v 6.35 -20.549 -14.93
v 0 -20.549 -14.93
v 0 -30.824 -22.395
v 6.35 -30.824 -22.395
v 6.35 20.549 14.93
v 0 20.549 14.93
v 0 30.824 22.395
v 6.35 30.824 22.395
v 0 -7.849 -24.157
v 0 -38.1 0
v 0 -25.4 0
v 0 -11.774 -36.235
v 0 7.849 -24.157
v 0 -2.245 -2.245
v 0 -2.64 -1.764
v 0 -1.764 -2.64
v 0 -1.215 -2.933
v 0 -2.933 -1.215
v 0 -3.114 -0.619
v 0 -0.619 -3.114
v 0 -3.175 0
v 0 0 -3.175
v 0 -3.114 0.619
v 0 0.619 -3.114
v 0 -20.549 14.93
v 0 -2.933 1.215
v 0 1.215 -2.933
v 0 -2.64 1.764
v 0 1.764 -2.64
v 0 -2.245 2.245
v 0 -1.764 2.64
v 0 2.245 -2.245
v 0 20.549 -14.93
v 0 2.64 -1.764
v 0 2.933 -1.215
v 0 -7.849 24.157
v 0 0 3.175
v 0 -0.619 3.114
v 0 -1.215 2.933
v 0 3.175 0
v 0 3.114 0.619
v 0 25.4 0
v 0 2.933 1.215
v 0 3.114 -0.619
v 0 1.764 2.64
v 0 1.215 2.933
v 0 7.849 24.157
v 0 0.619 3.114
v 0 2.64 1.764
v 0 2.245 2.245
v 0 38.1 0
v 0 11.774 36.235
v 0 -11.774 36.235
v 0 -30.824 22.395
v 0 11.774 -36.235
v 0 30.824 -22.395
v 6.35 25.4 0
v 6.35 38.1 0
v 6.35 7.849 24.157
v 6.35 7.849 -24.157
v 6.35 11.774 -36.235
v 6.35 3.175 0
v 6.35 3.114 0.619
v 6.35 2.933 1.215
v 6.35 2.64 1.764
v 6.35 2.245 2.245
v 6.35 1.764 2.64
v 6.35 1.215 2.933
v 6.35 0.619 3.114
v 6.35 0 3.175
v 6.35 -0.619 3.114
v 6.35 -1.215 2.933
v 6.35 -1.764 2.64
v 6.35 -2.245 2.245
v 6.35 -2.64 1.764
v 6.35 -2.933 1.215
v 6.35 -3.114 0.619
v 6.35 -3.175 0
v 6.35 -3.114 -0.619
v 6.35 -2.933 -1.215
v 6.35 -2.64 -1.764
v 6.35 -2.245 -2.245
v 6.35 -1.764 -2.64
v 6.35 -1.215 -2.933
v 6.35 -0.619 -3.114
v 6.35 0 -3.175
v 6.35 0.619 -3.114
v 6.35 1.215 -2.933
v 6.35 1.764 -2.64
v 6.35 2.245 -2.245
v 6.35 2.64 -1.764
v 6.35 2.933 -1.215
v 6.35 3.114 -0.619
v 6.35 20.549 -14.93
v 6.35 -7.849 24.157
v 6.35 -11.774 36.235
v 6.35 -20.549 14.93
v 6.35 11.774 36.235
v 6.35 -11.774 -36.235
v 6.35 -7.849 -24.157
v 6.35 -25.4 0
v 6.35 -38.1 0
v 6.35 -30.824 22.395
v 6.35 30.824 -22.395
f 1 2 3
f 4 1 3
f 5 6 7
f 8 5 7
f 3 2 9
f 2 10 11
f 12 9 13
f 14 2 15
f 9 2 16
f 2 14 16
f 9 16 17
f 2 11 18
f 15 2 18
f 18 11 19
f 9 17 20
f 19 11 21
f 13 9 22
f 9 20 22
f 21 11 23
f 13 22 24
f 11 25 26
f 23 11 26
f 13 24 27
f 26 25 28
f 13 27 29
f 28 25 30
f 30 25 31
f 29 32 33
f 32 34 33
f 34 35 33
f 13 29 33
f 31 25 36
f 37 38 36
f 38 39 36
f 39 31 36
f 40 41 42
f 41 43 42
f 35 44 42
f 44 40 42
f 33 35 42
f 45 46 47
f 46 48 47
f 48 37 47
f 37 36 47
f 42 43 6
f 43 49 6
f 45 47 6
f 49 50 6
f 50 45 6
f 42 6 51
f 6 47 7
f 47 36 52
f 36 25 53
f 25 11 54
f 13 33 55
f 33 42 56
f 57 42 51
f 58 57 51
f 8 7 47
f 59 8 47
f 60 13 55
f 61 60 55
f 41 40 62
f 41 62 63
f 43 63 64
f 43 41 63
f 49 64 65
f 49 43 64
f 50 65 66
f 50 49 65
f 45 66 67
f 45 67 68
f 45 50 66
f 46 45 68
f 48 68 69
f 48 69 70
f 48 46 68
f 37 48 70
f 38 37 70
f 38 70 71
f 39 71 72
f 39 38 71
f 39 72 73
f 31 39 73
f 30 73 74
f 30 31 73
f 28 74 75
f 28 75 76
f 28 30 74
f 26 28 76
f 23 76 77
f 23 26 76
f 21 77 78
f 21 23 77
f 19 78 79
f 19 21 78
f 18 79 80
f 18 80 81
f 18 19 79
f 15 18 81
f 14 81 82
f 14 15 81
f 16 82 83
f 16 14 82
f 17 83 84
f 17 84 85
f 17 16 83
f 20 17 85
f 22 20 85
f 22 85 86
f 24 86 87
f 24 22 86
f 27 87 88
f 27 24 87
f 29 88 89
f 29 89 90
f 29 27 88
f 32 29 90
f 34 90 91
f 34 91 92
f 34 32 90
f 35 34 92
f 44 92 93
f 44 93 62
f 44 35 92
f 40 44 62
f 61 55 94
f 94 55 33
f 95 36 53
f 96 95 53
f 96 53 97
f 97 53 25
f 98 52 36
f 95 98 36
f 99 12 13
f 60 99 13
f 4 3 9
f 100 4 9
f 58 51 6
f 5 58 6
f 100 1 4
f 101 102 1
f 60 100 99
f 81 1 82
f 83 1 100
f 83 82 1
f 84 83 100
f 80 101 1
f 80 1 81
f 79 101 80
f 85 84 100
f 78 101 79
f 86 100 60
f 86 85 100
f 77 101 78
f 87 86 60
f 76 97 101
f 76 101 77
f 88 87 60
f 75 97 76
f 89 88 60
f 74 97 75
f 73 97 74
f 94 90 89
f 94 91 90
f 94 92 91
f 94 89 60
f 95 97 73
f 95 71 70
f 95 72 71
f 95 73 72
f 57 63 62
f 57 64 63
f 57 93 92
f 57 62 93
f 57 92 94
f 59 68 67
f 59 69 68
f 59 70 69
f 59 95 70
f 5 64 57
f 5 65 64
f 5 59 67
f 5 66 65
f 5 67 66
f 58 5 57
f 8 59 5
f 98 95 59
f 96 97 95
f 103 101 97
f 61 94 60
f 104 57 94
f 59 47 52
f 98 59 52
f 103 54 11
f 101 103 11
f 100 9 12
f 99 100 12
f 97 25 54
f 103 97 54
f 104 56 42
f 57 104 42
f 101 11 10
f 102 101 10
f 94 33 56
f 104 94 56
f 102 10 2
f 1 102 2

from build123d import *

# Parameters (mm, degrees)
F0_R     = 3.175
F1_DEPTH = 6.35


with BuildPart() as f1:
    # F0 (on Right) → F1 (new body)
    with BuildSketch(Plane.YZ):
        Polygon((25.4, 0), (38.1, 0), (20.549032, 14.929745), (30.823547, 22.394618), (7.849032, 24.156836), (11.773547, 36.235253), (-7.849032, 24.156836), (-11.773547, 36.235253), (-20.549032, 14.929745), (-30.823547, 22.394618), (-25.4, 0), (-38.1, 0), (-20.549032, -14.929745), (-30.823547, -22.394618), (-7.849032, -24.156836), (-11.773547, -36.235253), (7.849032, -24.156836), (11.773547, -36.235253), (20.549032, -14.929745), (30.823547, -22.394618), align=None)
        Circle(F0_R, mode=Mode.SUBTRACT)
    extrude(amount=F1_DEPTH)


solid = f1.part
